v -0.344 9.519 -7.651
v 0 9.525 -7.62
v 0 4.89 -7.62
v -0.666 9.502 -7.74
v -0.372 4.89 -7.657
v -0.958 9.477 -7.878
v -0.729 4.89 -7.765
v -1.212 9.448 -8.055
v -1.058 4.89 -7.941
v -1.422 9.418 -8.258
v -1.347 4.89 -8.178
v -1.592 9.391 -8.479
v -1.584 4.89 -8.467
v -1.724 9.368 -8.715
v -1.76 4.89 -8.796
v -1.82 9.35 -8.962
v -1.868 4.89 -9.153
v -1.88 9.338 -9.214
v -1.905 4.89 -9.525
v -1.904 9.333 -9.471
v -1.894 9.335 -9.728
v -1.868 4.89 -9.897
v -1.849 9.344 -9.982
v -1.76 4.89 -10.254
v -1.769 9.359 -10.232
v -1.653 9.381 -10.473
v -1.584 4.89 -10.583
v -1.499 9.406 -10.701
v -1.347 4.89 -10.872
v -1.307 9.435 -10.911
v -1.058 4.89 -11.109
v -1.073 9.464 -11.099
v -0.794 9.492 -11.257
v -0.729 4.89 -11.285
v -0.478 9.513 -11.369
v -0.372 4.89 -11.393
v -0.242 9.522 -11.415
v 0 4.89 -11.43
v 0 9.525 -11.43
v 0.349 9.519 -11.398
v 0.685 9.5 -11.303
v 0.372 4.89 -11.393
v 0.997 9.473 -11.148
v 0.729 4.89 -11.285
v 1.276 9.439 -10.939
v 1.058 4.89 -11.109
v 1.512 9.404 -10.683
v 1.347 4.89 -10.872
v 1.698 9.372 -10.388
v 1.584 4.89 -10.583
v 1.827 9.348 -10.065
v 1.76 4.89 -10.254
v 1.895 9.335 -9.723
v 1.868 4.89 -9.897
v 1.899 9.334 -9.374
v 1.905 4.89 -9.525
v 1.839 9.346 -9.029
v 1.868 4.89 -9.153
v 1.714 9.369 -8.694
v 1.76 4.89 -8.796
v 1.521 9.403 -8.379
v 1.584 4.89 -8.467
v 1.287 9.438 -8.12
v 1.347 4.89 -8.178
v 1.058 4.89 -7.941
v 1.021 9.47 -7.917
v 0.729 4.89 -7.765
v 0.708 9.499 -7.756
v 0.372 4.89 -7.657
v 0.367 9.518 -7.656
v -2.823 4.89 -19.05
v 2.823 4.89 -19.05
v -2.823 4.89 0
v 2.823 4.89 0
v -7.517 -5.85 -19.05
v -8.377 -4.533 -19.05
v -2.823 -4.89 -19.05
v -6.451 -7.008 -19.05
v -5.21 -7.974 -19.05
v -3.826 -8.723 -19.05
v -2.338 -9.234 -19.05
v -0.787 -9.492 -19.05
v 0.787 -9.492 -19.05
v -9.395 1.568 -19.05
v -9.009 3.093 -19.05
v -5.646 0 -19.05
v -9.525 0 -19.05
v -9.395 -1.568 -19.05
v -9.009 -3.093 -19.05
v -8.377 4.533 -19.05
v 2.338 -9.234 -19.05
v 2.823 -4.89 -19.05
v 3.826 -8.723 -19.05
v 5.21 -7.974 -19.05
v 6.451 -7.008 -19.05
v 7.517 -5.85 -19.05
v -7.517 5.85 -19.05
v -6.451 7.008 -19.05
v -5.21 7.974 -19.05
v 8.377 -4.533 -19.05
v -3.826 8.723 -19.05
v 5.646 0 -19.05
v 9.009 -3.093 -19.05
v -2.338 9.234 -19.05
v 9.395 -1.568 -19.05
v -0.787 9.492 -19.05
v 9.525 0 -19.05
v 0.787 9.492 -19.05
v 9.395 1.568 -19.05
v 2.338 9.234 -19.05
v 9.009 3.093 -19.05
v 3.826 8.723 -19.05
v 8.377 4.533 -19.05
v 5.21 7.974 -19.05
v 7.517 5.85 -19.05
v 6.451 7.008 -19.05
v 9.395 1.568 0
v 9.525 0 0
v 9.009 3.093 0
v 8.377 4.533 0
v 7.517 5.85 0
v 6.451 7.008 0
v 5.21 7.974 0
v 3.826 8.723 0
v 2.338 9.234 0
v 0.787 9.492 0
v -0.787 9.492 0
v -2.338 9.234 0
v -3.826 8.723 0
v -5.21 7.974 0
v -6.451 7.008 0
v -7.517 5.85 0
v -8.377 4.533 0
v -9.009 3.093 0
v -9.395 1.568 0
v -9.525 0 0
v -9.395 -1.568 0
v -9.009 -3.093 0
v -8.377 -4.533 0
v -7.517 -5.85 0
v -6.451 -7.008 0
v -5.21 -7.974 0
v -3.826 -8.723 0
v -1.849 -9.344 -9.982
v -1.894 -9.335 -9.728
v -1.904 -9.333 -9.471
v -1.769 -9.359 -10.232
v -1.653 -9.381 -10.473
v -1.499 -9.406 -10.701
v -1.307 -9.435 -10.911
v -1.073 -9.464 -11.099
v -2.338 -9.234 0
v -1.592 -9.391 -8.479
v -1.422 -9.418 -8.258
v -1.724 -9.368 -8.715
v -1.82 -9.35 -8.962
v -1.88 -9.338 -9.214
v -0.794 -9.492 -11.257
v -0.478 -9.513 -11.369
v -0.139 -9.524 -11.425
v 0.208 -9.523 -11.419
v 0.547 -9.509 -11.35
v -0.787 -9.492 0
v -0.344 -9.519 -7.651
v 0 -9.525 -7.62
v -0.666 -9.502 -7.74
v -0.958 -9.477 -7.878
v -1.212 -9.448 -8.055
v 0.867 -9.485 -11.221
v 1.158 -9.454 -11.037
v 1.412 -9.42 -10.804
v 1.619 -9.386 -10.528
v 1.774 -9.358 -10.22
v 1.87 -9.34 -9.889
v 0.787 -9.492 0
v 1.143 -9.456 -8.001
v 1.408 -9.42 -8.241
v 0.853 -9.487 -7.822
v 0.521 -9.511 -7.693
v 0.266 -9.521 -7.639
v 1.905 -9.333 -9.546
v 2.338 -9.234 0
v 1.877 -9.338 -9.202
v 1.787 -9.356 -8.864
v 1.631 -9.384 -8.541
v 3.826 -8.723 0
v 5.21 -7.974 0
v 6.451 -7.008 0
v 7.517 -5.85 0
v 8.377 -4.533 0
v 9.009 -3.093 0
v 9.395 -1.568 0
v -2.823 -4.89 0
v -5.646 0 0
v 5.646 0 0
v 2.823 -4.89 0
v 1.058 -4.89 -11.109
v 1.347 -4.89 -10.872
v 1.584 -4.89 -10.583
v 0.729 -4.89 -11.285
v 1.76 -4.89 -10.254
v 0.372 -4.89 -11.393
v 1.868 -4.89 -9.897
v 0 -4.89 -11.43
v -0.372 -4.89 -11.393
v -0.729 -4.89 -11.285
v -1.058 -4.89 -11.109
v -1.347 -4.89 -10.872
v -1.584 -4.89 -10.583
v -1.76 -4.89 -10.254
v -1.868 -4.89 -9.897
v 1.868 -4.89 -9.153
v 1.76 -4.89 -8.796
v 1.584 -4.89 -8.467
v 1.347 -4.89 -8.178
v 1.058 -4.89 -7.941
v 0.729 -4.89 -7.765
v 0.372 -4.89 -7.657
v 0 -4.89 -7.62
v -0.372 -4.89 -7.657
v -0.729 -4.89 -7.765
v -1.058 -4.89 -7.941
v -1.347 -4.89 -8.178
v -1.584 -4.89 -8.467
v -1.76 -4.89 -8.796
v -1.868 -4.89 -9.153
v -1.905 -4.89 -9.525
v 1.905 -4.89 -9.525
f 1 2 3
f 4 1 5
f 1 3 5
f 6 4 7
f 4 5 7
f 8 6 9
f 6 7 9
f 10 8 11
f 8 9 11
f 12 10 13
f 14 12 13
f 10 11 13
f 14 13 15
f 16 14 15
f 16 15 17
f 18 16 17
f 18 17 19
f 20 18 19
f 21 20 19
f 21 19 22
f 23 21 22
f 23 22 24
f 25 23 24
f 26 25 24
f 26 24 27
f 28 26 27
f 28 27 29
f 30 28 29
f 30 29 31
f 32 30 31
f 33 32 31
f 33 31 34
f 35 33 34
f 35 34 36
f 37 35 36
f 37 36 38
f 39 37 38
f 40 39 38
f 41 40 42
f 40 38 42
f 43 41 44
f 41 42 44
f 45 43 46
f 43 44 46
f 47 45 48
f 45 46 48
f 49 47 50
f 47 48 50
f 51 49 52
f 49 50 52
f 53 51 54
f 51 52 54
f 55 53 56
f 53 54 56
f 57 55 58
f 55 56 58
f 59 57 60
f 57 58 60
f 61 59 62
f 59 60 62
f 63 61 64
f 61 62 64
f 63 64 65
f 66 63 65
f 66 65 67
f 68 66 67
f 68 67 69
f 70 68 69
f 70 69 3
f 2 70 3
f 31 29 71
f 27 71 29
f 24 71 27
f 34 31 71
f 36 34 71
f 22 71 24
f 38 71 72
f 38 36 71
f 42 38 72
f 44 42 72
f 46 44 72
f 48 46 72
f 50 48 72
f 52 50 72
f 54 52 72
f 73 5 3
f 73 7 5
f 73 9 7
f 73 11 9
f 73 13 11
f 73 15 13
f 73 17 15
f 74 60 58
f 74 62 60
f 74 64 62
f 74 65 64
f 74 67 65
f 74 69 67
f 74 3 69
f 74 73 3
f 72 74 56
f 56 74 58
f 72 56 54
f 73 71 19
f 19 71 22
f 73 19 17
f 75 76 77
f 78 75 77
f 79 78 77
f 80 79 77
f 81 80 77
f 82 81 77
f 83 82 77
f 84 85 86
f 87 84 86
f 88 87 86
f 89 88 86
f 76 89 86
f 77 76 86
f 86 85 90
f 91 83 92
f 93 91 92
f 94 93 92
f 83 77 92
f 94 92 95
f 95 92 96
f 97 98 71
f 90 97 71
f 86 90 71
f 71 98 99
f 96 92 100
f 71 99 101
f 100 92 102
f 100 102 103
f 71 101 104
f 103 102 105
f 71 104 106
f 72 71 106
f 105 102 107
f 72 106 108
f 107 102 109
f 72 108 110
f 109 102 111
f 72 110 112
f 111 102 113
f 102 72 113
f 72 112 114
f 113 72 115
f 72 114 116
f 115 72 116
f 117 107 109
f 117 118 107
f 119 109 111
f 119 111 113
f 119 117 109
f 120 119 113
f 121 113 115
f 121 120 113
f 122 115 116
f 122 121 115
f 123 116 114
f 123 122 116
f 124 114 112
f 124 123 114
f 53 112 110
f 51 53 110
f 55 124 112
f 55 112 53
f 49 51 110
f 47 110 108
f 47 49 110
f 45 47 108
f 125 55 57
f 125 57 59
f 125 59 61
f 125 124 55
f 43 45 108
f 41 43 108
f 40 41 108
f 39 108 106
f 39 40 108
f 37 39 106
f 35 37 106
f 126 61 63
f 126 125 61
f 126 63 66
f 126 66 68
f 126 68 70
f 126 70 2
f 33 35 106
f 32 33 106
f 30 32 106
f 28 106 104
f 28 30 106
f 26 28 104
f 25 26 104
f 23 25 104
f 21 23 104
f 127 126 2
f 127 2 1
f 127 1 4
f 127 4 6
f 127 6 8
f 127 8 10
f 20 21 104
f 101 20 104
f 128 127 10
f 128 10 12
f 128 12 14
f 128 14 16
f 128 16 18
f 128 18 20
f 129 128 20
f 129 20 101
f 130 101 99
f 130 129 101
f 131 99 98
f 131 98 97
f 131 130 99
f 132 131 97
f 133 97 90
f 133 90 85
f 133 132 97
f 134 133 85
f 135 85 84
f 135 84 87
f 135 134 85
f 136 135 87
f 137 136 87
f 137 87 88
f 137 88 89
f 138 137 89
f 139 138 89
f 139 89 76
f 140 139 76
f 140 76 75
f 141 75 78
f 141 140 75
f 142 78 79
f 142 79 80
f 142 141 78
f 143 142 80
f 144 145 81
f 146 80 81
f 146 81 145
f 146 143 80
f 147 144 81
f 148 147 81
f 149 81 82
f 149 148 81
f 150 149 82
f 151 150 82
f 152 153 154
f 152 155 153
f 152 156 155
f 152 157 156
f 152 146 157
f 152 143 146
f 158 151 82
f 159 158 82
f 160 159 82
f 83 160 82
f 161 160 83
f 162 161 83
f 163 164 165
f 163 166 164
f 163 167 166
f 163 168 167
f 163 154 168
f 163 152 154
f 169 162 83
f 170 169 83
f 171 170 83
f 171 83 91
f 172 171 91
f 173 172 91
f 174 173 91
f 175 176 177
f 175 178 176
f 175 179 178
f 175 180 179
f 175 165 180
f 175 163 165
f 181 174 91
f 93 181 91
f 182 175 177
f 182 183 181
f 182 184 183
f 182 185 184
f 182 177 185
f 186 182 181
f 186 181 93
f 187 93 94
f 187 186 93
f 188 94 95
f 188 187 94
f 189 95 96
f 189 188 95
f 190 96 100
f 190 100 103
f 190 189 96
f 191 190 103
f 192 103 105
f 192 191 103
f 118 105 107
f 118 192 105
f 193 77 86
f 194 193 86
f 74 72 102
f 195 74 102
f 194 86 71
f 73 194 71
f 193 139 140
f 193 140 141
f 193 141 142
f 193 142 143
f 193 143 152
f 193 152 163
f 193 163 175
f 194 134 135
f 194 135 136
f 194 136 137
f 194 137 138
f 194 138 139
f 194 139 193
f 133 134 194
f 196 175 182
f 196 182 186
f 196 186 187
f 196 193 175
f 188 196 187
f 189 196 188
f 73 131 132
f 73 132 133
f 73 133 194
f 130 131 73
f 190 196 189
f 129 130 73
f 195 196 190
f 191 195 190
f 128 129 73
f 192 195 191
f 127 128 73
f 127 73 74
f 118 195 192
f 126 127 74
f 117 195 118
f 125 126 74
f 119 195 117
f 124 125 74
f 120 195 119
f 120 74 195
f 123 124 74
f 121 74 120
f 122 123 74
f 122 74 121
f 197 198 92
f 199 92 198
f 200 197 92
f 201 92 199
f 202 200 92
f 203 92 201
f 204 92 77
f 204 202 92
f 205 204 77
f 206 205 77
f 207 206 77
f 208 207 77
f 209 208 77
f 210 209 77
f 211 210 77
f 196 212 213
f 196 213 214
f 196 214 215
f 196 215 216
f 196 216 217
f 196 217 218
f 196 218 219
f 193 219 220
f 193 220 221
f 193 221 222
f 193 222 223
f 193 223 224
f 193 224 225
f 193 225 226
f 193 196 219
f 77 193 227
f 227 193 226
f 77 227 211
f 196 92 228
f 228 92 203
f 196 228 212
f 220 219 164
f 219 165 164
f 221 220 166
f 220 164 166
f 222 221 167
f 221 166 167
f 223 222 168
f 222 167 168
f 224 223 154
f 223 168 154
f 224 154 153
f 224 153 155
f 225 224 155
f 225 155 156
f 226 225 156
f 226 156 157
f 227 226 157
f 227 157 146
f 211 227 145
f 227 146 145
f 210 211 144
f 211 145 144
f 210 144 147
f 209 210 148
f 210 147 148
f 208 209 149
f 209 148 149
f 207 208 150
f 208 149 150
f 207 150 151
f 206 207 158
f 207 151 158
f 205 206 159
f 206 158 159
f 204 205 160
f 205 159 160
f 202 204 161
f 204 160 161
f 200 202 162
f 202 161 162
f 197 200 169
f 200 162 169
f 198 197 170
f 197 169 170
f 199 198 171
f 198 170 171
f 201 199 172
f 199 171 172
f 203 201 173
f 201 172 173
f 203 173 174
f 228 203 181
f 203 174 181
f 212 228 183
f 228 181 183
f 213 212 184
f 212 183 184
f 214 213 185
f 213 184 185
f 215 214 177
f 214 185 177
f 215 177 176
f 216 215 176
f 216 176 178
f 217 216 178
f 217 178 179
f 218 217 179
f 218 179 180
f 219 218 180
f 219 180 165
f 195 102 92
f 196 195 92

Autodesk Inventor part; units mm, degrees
ref_plane "YZ Plane" through (0, 0, 0) normal (1, 0, 0) x (0, 1, 0)
ref_plane "XY Plane" through (0, 0, 0) normal (0, 0, 1) x (1, 0, 0)
sketch "Sketch1" plane through (0, 0, 0) normal (0, 0, 1) x (1, 0, 0)
  line L0 (2.7496, 4.7625) -> (5.4993, 0)
  line L1 (5.4993, 0) -> (2.7496, -4.7625)
  line L2 (2.7496, -4.7625) -> (-2.7496, -4.7625)
  line L3 (-2.7496, -4.7625) -> (-5.4993, 0)
  line L4 (-5.4993, 0) -> (-2.7496, 4.7625)
  line L5 (-2.7496, 4.7625) -> (2.7496, 4.7625)
  circle A0 centre (0, 0) radius 9.525
  circle A1 centre (0, 0) radius 5.4993 construction
  dimension "d0" = 9.525
  dimension "d2" = 19.05
  dimension "d3" = 4.0257
extrude "Extrusion1" add sketch "Sketch1" against normal blind 19.05
thicken "Thicken Hex" operation add thickness 0.127 both sides no extend neighbours yes toward (-0.8660254, 0.5, 0) faces at (-4.5827, 1.5875, -6.35) (-3.6662, -3.175, -6.35) (0.9165, -4.7625, -6.35) (-0.9165, 4.7625, -6.35) (3.6662, 3.175, -6.35) (4.5827, -1.5875, -6.35)
ref_plane "Work Plane1" through (0, 9.525, 0) normal (0, 1, 0) x (-1, 0, 0)
sketch "Sketch3" plane through (0, 9.525, 0) normal (0, 1, 0) x (-1, 0, 0)
  line L0 (0, 0) -> (0, -19.05) construction
  line L1 (-9.525, -19.05) -> (9.525, -19.05) construction
  point P0 (0, -9.525)
hole "Hole1" at (0, 9.525, -9.525) direction (0, -1, 0) diameter 3.81 end through all clearance for "Flat Head Machine Screw (82)" size "#6" standard "Ansi Unified Screw Threads"
equation "\"d0\" = hexSize"
equation "\"d2\" = exteriorDiameter"
equation "\"d4\" = length"
equation "\"d6\" = printSpacing"
equation "\"d7\" = printSpacing"
equation "\"hexSize\" = 9.525"
equation "\"exteriorDiameter\" = 19.05"
equation "\"length\" = 19.05"
equation "\"printSpacing\" = 0.127"
properties part number "3_8x3_4x3_4-hexBearing" material "PC/ABS Plastic"
